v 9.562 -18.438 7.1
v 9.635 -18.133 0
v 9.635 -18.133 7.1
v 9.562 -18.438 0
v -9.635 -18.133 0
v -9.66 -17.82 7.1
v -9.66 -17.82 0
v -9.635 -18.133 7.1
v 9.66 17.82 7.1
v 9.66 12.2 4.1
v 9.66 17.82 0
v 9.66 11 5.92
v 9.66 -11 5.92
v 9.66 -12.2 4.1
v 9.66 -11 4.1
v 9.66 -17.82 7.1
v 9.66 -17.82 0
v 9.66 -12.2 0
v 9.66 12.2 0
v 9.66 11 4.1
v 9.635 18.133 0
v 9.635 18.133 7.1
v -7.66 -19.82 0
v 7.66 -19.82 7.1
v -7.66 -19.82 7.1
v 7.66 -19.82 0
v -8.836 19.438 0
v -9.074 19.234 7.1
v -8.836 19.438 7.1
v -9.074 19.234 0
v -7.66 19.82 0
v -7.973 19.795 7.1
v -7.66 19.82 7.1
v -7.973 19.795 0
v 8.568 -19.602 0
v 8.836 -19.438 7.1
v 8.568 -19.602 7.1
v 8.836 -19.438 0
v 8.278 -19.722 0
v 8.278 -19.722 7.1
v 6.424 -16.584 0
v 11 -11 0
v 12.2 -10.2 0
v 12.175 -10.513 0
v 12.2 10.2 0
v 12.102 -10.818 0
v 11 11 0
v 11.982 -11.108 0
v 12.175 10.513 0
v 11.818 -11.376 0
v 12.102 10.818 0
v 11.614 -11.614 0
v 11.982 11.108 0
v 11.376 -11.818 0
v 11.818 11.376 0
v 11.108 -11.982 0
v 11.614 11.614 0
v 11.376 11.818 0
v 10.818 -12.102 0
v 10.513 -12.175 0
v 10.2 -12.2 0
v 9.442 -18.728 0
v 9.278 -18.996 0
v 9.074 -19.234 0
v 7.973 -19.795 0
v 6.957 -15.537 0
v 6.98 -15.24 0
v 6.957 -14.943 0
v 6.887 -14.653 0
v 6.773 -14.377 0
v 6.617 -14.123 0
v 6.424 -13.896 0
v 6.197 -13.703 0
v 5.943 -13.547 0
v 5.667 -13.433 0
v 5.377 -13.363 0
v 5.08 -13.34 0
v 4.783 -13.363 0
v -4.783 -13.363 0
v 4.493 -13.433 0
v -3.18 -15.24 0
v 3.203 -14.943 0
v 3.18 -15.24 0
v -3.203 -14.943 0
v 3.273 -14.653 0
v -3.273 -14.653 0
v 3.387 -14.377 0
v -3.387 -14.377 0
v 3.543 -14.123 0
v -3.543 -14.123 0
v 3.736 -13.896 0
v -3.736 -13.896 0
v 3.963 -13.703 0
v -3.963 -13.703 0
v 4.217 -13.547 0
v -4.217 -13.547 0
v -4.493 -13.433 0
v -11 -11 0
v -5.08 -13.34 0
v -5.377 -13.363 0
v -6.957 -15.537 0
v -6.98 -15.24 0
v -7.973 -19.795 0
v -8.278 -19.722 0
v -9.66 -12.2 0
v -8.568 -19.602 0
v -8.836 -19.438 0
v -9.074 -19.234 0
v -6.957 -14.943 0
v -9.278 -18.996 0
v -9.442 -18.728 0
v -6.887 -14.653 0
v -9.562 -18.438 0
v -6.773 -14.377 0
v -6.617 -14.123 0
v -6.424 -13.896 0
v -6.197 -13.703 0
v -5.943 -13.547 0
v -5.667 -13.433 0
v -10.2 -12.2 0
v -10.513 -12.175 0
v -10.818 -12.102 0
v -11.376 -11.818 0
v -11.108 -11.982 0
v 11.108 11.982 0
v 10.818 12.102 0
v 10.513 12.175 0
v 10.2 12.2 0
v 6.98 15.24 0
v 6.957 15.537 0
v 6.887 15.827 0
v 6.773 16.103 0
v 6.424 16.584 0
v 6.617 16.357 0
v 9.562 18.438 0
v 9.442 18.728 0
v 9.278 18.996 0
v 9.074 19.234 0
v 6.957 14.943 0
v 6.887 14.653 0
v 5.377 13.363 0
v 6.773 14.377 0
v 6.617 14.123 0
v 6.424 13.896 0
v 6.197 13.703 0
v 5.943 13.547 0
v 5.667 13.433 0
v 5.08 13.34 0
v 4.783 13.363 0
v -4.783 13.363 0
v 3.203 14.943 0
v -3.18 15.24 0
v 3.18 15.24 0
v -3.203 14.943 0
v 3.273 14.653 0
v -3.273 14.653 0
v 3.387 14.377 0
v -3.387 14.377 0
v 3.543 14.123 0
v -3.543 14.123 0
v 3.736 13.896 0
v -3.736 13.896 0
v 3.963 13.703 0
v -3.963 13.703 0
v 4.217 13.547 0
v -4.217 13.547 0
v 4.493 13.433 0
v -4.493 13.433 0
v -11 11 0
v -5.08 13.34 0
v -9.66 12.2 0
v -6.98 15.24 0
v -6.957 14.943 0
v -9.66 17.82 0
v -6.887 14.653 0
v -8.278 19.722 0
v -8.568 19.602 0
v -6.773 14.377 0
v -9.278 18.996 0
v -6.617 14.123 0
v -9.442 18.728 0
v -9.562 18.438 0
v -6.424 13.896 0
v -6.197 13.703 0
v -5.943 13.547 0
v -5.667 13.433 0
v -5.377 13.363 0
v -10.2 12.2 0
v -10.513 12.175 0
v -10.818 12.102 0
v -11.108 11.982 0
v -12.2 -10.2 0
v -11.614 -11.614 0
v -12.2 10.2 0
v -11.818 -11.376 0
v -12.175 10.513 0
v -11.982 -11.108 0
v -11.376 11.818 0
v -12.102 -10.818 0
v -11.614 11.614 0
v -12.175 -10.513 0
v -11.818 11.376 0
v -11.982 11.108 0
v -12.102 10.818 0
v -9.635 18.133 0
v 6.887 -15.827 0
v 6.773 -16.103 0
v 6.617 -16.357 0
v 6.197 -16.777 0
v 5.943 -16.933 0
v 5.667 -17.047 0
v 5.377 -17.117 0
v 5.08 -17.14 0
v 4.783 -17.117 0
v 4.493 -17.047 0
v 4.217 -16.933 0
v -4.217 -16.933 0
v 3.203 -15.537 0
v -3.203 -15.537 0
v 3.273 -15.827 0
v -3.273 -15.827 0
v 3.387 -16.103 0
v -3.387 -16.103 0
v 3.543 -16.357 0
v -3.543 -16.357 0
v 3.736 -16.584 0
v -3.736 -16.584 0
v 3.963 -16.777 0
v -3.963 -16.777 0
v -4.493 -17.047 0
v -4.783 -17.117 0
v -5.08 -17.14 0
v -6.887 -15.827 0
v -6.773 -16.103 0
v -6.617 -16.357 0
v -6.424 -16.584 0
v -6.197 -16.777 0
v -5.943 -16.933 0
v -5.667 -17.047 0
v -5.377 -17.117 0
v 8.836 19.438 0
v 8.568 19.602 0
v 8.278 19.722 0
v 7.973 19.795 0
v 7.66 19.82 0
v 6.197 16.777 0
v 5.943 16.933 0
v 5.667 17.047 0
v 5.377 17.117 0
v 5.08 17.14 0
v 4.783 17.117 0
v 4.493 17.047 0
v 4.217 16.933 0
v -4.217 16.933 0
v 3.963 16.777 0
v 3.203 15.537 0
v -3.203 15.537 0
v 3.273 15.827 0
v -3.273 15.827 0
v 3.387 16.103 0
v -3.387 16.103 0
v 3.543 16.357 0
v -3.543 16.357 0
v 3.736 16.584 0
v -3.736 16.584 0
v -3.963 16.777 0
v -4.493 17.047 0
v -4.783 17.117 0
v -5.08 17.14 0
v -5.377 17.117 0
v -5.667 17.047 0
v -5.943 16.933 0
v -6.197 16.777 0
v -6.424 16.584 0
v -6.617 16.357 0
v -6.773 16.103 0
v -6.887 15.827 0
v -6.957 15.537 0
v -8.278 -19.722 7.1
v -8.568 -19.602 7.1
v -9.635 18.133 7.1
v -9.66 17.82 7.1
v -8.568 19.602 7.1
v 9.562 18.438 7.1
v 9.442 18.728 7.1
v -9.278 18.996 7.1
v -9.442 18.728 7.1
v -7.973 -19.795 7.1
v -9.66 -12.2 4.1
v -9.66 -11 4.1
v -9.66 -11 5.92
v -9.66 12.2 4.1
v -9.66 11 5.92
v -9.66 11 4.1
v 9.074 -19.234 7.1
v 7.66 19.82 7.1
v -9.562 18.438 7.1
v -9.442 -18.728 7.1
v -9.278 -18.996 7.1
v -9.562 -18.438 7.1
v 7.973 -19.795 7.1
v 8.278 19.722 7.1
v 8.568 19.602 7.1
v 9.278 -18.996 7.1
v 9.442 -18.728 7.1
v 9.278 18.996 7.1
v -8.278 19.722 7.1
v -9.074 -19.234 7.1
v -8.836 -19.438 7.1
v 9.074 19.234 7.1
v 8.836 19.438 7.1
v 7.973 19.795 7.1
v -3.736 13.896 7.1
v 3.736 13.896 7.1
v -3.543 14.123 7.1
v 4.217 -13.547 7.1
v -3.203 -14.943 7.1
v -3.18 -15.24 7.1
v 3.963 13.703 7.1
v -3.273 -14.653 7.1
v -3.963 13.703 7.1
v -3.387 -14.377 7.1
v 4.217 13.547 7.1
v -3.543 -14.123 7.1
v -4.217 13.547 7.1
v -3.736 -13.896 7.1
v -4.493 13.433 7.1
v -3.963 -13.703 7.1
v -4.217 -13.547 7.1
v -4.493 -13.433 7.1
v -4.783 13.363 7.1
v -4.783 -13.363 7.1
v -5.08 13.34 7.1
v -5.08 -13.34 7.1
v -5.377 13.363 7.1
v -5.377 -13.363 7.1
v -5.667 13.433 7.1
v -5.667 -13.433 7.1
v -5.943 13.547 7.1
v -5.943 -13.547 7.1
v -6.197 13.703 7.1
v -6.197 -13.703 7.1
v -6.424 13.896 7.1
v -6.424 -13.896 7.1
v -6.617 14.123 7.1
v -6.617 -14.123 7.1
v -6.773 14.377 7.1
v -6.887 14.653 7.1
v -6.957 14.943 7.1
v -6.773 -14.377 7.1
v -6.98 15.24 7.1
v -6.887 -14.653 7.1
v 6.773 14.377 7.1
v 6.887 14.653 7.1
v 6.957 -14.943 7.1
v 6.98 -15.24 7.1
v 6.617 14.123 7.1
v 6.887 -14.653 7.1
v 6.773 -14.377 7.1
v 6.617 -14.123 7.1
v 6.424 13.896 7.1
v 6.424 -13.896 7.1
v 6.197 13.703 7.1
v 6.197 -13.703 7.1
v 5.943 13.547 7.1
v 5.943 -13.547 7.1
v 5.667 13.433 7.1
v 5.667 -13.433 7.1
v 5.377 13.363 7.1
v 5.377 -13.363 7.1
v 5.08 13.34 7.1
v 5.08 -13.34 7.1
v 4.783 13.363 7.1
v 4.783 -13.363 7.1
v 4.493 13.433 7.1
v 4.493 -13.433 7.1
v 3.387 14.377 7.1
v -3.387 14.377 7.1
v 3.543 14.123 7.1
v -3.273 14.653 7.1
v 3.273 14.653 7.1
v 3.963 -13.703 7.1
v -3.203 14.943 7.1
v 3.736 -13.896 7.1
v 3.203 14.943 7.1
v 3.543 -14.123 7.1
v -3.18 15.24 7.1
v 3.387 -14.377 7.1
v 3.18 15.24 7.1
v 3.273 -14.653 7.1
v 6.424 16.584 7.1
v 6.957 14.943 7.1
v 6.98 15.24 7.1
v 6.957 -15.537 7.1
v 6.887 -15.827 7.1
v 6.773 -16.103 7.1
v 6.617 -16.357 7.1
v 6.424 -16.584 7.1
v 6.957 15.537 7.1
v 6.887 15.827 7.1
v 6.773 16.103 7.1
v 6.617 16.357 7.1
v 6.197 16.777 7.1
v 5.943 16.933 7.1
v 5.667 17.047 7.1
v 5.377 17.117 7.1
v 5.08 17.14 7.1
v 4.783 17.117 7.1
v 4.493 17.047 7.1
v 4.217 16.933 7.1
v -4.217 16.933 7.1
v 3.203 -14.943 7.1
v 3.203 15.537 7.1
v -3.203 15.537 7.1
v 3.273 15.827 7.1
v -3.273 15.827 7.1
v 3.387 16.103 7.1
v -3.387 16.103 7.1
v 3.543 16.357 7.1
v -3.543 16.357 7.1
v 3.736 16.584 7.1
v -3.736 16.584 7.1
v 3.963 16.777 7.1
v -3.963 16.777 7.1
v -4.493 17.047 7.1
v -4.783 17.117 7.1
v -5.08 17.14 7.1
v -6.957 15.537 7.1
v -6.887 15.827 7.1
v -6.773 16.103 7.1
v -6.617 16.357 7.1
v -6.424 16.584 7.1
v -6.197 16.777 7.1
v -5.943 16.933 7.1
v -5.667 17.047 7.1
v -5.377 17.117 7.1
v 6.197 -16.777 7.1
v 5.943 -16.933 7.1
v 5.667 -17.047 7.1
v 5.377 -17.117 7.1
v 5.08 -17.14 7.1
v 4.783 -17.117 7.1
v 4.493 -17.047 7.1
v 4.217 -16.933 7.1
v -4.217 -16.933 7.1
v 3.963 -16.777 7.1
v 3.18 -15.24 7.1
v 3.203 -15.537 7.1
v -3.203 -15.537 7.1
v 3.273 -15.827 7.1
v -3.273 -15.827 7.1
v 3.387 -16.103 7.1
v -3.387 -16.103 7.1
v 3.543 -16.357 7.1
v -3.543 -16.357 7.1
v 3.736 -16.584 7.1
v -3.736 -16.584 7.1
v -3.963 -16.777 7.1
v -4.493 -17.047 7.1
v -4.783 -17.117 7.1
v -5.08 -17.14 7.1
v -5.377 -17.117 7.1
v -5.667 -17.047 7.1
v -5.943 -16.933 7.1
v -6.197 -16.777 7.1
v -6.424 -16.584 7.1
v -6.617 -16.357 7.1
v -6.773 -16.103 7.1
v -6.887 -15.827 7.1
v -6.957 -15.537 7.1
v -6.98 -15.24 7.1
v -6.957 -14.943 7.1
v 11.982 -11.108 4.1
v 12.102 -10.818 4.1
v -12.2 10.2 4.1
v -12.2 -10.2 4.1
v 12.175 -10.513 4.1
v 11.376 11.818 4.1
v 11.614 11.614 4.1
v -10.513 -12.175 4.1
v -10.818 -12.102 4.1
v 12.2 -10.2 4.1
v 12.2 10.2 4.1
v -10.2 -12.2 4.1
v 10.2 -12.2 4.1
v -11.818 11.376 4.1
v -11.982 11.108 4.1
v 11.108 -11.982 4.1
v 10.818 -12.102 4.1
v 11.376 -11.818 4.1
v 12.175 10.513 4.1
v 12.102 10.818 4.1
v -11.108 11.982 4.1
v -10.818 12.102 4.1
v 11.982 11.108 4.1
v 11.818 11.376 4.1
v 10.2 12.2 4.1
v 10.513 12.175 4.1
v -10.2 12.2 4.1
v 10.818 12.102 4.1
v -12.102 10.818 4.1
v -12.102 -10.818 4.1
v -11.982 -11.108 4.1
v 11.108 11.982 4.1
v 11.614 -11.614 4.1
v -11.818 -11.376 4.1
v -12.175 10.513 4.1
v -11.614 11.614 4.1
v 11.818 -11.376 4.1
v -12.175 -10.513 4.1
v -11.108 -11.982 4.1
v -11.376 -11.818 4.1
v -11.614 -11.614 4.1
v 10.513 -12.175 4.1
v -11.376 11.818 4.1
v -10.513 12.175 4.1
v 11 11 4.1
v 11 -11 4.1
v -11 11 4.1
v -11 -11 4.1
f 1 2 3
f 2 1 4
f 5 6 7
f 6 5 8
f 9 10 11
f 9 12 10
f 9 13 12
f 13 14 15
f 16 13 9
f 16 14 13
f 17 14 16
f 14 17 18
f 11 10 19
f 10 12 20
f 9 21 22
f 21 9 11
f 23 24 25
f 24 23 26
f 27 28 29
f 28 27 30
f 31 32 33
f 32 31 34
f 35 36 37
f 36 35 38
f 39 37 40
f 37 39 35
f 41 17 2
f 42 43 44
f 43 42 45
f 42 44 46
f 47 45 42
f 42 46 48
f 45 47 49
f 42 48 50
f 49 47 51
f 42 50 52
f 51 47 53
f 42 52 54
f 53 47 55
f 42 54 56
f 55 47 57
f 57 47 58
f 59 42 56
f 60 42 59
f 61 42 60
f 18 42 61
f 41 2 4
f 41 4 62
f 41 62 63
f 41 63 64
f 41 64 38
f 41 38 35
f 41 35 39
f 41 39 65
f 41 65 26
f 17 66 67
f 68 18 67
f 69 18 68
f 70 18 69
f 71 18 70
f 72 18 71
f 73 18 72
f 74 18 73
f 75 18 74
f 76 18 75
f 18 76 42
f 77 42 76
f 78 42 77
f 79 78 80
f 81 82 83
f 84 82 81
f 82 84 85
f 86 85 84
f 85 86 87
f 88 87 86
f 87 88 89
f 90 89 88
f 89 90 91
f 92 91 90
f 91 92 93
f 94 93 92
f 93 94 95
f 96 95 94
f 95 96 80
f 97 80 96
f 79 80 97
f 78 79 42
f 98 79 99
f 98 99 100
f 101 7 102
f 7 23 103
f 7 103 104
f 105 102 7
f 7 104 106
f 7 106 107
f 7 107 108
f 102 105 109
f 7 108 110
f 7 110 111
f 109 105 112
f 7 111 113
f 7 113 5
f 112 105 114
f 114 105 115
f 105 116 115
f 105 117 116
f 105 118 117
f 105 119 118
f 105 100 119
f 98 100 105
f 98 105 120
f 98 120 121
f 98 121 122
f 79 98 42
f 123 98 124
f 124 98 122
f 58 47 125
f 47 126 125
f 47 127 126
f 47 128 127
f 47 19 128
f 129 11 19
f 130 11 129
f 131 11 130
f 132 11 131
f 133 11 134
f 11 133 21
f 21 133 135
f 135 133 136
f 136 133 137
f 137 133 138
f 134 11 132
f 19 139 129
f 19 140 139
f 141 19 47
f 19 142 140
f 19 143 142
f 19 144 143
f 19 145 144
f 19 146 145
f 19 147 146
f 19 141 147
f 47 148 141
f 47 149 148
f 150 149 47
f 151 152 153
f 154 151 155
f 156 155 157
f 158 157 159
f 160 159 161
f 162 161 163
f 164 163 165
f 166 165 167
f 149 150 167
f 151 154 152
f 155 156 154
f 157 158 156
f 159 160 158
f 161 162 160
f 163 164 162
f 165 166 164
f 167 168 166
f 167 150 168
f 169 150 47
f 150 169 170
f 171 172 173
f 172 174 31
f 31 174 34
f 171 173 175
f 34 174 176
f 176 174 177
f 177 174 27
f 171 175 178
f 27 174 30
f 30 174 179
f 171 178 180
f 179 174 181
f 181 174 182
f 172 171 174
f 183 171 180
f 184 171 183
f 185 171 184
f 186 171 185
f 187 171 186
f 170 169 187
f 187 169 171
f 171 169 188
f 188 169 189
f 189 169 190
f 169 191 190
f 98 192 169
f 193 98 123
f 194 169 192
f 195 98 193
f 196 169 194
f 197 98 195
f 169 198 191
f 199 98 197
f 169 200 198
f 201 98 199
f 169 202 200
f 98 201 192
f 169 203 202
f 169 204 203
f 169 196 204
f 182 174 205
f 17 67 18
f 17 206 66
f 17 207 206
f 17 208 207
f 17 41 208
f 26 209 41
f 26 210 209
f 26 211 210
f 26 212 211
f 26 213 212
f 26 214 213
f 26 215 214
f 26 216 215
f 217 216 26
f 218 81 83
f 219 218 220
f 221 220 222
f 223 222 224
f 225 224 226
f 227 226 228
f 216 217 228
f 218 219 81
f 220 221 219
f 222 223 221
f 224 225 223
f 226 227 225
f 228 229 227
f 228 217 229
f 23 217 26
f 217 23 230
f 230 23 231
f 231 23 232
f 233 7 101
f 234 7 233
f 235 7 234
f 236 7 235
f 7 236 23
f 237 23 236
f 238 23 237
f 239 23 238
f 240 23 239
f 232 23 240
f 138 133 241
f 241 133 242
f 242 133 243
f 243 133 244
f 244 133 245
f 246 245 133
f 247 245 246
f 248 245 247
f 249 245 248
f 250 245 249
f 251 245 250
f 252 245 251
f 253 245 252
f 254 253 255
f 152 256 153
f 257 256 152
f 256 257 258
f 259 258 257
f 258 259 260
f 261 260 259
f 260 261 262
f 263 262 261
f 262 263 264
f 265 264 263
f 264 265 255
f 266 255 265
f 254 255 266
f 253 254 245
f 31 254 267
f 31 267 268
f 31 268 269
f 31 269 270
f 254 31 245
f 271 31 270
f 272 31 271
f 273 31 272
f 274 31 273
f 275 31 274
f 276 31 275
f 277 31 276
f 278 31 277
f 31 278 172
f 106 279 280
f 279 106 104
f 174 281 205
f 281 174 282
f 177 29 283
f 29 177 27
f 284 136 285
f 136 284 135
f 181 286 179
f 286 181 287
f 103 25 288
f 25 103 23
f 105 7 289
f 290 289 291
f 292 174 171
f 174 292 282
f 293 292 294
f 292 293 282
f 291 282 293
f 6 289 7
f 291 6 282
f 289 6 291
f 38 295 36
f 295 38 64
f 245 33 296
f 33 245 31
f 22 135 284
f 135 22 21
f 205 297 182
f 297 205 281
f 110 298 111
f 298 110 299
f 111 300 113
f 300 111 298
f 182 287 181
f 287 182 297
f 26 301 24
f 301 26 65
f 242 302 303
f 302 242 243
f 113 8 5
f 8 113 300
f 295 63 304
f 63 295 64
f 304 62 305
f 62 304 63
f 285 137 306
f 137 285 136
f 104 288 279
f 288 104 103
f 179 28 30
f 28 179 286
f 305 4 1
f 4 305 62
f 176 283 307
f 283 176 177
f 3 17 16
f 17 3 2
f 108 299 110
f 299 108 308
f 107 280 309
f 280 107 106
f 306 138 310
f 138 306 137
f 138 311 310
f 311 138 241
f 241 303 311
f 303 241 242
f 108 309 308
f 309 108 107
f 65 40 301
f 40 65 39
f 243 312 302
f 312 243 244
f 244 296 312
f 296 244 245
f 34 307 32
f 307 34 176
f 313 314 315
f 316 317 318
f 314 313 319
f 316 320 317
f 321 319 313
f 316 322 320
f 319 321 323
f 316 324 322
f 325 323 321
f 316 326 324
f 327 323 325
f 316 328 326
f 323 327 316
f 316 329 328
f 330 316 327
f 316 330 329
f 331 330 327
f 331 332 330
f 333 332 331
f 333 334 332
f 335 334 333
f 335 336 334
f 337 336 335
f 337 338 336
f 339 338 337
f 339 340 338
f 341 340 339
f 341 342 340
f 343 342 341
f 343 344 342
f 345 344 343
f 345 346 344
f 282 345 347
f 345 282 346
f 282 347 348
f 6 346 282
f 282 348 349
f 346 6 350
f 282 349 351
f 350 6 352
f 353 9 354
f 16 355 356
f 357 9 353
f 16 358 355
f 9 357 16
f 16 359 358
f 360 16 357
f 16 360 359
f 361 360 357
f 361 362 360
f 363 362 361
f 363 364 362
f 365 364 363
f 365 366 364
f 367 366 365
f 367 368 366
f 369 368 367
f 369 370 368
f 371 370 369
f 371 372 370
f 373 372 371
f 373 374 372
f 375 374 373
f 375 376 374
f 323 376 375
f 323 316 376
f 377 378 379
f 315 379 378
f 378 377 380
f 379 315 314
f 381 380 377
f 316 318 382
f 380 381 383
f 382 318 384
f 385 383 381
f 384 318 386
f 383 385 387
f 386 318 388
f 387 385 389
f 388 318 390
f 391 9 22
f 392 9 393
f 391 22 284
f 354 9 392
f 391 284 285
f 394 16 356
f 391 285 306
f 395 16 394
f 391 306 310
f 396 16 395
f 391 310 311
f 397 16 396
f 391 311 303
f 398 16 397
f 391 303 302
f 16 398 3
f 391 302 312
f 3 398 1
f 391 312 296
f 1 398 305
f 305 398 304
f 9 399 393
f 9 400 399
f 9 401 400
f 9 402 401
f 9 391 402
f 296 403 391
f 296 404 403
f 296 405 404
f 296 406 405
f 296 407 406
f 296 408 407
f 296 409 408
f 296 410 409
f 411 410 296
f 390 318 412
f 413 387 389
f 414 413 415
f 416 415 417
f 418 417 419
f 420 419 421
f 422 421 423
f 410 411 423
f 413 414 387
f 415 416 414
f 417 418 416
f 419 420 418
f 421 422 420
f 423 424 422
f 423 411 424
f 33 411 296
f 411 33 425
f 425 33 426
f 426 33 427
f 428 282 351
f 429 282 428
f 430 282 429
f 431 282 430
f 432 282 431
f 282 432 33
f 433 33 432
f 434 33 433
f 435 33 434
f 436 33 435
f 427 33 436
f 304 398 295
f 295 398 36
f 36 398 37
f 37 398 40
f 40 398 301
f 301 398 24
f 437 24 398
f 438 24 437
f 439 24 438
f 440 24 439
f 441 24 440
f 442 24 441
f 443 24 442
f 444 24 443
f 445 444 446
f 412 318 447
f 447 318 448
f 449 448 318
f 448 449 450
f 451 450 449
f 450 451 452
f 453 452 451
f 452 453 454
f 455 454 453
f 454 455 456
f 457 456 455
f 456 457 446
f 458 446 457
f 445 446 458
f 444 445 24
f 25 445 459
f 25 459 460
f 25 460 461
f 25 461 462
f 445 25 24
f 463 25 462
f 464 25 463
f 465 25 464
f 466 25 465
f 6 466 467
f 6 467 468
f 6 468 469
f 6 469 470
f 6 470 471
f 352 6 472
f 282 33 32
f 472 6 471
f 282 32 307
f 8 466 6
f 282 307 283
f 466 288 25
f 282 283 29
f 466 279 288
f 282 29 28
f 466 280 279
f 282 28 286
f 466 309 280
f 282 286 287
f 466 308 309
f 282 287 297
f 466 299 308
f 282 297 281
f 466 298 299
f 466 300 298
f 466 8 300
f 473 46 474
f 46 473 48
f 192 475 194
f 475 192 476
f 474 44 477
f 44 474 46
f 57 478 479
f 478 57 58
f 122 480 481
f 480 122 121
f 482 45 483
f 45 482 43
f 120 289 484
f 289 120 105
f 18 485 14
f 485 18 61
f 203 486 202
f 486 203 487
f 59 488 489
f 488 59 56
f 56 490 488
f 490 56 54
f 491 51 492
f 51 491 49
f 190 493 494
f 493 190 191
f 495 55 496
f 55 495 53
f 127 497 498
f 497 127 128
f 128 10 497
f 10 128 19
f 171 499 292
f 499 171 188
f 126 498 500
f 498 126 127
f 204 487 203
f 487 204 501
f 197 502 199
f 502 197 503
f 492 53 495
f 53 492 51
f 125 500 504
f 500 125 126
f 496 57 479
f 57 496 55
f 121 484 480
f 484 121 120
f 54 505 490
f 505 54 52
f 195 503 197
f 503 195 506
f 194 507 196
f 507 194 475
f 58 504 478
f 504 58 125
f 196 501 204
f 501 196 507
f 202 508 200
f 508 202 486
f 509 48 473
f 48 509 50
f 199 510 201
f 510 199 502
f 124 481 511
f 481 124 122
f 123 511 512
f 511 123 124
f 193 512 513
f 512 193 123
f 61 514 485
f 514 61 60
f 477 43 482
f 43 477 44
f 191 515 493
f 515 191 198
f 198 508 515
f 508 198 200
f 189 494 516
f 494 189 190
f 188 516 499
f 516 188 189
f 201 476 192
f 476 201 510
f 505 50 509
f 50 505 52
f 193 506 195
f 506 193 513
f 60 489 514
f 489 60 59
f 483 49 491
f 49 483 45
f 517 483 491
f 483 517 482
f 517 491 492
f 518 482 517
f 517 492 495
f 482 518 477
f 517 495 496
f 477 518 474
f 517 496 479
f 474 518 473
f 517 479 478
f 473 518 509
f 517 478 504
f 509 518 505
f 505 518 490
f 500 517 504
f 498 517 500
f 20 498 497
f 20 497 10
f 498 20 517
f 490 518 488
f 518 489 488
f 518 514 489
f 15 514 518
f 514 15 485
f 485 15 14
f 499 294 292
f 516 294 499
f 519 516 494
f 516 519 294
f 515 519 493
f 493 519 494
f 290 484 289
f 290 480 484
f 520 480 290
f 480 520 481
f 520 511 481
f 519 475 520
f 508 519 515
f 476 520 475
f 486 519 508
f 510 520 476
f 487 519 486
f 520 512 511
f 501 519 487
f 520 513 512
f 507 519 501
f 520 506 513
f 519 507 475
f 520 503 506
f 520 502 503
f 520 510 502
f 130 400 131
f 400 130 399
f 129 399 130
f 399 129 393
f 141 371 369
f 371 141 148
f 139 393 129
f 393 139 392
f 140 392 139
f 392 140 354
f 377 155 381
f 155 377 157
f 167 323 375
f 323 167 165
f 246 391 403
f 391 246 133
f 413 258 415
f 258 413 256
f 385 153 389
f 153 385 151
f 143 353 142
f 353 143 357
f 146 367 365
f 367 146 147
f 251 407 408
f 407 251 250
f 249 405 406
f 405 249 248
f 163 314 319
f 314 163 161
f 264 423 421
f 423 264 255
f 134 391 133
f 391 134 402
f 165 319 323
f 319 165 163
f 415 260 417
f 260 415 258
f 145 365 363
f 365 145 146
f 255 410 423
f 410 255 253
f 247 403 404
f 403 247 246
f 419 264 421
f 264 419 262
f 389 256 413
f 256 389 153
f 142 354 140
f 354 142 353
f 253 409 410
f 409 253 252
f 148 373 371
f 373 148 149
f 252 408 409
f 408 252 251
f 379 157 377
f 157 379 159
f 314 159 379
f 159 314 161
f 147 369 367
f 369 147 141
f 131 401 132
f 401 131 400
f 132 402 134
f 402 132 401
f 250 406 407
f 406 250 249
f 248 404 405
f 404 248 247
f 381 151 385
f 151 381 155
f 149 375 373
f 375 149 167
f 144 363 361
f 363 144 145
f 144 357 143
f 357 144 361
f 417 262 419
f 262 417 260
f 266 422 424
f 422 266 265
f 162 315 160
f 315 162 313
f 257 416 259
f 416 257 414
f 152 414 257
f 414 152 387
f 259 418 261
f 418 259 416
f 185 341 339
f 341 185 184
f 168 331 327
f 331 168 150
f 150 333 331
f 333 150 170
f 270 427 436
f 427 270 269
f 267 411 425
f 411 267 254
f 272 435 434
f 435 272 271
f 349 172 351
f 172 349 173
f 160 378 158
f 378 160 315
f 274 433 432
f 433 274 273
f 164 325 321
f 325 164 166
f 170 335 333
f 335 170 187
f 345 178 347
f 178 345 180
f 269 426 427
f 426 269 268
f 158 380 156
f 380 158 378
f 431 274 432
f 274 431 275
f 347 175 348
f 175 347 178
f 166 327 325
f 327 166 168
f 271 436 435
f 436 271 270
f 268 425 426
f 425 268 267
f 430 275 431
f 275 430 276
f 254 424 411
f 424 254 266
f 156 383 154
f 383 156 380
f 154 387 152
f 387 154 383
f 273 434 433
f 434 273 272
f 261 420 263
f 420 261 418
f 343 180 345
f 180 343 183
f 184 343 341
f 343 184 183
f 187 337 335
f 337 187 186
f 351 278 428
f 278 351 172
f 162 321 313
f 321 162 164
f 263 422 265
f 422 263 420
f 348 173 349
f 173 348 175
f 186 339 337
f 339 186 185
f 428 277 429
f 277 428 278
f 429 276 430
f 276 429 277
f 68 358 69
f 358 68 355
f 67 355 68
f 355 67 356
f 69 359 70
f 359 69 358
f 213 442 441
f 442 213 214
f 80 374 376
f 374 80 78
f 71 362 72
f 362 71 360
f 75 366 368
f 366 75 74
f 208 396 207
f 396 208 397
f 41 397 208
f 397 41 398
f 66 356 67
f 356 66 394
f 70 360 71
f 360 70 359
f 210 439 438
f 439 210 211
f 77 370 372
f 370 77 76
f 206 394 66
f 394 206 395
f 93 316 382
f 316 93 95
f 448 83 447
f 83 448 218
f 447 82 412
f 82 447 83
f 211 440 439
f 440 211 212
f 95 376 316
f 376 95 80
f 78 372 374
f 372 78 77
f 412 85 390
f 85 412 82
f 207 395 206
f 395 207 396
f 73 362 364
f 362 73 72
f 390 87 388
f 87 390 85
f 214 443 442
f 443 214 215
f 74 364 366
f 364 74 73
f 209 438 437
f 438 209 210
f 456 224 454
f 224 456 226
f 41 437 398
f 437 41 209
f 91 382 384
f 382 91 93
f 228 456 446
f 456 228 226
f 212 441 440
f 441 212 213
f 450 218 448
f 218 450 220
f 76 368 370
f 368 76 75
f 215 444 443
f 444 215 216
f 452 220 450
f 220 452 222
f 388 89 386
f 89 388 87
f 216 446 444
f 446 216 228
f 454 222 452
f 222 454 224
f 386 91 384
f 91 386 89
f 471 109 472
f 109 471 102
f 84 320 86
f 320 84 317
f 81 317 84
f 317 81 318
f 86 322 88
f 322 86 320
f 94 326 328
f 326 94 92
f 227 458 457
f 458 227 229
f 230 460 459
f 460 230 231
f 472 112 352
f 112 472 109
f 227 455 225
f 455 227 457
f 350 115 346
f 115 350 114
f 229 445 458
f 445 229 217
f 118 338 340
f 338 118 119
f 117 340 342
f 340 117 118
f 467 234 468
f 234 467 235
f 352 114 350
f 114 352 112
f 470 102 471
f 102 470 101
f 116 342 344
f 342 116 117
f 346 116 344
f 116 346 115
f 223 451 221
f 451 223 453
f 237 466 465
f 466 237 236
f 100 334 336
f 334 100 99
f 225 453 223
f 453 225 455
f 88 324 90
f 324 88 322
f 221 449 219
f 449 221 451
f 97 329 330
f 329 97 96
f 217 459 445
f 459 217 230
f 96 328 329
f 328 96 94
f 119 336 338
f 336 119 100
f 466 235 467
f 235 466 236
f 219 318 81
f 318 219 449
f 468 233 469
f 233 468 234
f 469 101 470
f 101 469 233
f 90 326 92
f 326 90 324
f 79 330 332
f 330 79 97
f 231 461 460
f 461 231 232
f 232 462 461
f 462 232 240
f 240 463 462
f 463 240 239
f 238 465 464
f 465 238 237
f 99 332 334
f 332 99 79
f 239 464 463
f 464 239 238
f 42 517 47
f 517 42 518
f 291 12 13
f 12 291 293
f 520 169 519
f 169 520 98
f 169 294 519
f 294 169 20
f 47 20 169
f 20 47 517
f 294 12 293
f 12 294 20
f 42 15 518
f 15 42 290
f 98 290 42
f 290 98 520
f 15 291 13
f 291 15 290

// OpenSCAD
// file: ../configuration.scad
$fn=40; // model faces resolution.

//OBECNE PARAMETRY 
//----------------------------------------------------------------
//----------------------------------------------------------------

vyska_krystalu=15;
vyska_sipm=2;
presah_krystalu=6;
rezerva_nad_krystalem=5;
vyska_drzaku_krystalu=vyska_krystalu-presah_krystalu-2;

hrana_krystalu=6; //čistá hrana

// big-big
//zakladna_krystalu_x=23.7; //1.5mm rezerva hrana SIPM je 22 mm
//zakladna_krystalu_y=23.7;
// big-small
zakladna_krystalu_x=22.0; //1.5mm rezerva hrana SIPM je 22 mm
zakladna_krystalu_y=22.0;
sila_steny=1.2;
sila_materialu_zakladny=7; //1.6;


vyska_zapusti_pro_PCB=0; //výčka krycího matriálu pro PCB a zároveň pro vytvoření vany pro zalití silikonem, kvůli světlotěsnoti.
vyska_SIPM_nad_PCB=2.4; //výška celého SIPM senzoru
tolerance_pro_dotazeni_k_SIPM=-0.5; // kvůli dotažení krystalu k SIPM
velikost_modulu_x=2; //počet der
velikost_modulu_y=4;
rotec_der_modulu=10.16;

vyska_matky=3;
sirka_matky=6.7;
prumer_sroubu=3.6;//3.4;
prumer_hlavy_sroubu=6;
vyska_hlavy_sroubu=5;

//Pro díl SIPMBOX01C_D02
D02_velikost_modulu_x=3; //počet der
D02_velikost_modulu_y=4;
D02_vyska_bocniho_prekryvu=25;

//Pro díl SIPMBOX01C_D07
D07_vyska=6;
// main file
use <../src/SIPMBOX01C.scad>

include <../configuration.scad>

SIPMBOX01C_D06();
